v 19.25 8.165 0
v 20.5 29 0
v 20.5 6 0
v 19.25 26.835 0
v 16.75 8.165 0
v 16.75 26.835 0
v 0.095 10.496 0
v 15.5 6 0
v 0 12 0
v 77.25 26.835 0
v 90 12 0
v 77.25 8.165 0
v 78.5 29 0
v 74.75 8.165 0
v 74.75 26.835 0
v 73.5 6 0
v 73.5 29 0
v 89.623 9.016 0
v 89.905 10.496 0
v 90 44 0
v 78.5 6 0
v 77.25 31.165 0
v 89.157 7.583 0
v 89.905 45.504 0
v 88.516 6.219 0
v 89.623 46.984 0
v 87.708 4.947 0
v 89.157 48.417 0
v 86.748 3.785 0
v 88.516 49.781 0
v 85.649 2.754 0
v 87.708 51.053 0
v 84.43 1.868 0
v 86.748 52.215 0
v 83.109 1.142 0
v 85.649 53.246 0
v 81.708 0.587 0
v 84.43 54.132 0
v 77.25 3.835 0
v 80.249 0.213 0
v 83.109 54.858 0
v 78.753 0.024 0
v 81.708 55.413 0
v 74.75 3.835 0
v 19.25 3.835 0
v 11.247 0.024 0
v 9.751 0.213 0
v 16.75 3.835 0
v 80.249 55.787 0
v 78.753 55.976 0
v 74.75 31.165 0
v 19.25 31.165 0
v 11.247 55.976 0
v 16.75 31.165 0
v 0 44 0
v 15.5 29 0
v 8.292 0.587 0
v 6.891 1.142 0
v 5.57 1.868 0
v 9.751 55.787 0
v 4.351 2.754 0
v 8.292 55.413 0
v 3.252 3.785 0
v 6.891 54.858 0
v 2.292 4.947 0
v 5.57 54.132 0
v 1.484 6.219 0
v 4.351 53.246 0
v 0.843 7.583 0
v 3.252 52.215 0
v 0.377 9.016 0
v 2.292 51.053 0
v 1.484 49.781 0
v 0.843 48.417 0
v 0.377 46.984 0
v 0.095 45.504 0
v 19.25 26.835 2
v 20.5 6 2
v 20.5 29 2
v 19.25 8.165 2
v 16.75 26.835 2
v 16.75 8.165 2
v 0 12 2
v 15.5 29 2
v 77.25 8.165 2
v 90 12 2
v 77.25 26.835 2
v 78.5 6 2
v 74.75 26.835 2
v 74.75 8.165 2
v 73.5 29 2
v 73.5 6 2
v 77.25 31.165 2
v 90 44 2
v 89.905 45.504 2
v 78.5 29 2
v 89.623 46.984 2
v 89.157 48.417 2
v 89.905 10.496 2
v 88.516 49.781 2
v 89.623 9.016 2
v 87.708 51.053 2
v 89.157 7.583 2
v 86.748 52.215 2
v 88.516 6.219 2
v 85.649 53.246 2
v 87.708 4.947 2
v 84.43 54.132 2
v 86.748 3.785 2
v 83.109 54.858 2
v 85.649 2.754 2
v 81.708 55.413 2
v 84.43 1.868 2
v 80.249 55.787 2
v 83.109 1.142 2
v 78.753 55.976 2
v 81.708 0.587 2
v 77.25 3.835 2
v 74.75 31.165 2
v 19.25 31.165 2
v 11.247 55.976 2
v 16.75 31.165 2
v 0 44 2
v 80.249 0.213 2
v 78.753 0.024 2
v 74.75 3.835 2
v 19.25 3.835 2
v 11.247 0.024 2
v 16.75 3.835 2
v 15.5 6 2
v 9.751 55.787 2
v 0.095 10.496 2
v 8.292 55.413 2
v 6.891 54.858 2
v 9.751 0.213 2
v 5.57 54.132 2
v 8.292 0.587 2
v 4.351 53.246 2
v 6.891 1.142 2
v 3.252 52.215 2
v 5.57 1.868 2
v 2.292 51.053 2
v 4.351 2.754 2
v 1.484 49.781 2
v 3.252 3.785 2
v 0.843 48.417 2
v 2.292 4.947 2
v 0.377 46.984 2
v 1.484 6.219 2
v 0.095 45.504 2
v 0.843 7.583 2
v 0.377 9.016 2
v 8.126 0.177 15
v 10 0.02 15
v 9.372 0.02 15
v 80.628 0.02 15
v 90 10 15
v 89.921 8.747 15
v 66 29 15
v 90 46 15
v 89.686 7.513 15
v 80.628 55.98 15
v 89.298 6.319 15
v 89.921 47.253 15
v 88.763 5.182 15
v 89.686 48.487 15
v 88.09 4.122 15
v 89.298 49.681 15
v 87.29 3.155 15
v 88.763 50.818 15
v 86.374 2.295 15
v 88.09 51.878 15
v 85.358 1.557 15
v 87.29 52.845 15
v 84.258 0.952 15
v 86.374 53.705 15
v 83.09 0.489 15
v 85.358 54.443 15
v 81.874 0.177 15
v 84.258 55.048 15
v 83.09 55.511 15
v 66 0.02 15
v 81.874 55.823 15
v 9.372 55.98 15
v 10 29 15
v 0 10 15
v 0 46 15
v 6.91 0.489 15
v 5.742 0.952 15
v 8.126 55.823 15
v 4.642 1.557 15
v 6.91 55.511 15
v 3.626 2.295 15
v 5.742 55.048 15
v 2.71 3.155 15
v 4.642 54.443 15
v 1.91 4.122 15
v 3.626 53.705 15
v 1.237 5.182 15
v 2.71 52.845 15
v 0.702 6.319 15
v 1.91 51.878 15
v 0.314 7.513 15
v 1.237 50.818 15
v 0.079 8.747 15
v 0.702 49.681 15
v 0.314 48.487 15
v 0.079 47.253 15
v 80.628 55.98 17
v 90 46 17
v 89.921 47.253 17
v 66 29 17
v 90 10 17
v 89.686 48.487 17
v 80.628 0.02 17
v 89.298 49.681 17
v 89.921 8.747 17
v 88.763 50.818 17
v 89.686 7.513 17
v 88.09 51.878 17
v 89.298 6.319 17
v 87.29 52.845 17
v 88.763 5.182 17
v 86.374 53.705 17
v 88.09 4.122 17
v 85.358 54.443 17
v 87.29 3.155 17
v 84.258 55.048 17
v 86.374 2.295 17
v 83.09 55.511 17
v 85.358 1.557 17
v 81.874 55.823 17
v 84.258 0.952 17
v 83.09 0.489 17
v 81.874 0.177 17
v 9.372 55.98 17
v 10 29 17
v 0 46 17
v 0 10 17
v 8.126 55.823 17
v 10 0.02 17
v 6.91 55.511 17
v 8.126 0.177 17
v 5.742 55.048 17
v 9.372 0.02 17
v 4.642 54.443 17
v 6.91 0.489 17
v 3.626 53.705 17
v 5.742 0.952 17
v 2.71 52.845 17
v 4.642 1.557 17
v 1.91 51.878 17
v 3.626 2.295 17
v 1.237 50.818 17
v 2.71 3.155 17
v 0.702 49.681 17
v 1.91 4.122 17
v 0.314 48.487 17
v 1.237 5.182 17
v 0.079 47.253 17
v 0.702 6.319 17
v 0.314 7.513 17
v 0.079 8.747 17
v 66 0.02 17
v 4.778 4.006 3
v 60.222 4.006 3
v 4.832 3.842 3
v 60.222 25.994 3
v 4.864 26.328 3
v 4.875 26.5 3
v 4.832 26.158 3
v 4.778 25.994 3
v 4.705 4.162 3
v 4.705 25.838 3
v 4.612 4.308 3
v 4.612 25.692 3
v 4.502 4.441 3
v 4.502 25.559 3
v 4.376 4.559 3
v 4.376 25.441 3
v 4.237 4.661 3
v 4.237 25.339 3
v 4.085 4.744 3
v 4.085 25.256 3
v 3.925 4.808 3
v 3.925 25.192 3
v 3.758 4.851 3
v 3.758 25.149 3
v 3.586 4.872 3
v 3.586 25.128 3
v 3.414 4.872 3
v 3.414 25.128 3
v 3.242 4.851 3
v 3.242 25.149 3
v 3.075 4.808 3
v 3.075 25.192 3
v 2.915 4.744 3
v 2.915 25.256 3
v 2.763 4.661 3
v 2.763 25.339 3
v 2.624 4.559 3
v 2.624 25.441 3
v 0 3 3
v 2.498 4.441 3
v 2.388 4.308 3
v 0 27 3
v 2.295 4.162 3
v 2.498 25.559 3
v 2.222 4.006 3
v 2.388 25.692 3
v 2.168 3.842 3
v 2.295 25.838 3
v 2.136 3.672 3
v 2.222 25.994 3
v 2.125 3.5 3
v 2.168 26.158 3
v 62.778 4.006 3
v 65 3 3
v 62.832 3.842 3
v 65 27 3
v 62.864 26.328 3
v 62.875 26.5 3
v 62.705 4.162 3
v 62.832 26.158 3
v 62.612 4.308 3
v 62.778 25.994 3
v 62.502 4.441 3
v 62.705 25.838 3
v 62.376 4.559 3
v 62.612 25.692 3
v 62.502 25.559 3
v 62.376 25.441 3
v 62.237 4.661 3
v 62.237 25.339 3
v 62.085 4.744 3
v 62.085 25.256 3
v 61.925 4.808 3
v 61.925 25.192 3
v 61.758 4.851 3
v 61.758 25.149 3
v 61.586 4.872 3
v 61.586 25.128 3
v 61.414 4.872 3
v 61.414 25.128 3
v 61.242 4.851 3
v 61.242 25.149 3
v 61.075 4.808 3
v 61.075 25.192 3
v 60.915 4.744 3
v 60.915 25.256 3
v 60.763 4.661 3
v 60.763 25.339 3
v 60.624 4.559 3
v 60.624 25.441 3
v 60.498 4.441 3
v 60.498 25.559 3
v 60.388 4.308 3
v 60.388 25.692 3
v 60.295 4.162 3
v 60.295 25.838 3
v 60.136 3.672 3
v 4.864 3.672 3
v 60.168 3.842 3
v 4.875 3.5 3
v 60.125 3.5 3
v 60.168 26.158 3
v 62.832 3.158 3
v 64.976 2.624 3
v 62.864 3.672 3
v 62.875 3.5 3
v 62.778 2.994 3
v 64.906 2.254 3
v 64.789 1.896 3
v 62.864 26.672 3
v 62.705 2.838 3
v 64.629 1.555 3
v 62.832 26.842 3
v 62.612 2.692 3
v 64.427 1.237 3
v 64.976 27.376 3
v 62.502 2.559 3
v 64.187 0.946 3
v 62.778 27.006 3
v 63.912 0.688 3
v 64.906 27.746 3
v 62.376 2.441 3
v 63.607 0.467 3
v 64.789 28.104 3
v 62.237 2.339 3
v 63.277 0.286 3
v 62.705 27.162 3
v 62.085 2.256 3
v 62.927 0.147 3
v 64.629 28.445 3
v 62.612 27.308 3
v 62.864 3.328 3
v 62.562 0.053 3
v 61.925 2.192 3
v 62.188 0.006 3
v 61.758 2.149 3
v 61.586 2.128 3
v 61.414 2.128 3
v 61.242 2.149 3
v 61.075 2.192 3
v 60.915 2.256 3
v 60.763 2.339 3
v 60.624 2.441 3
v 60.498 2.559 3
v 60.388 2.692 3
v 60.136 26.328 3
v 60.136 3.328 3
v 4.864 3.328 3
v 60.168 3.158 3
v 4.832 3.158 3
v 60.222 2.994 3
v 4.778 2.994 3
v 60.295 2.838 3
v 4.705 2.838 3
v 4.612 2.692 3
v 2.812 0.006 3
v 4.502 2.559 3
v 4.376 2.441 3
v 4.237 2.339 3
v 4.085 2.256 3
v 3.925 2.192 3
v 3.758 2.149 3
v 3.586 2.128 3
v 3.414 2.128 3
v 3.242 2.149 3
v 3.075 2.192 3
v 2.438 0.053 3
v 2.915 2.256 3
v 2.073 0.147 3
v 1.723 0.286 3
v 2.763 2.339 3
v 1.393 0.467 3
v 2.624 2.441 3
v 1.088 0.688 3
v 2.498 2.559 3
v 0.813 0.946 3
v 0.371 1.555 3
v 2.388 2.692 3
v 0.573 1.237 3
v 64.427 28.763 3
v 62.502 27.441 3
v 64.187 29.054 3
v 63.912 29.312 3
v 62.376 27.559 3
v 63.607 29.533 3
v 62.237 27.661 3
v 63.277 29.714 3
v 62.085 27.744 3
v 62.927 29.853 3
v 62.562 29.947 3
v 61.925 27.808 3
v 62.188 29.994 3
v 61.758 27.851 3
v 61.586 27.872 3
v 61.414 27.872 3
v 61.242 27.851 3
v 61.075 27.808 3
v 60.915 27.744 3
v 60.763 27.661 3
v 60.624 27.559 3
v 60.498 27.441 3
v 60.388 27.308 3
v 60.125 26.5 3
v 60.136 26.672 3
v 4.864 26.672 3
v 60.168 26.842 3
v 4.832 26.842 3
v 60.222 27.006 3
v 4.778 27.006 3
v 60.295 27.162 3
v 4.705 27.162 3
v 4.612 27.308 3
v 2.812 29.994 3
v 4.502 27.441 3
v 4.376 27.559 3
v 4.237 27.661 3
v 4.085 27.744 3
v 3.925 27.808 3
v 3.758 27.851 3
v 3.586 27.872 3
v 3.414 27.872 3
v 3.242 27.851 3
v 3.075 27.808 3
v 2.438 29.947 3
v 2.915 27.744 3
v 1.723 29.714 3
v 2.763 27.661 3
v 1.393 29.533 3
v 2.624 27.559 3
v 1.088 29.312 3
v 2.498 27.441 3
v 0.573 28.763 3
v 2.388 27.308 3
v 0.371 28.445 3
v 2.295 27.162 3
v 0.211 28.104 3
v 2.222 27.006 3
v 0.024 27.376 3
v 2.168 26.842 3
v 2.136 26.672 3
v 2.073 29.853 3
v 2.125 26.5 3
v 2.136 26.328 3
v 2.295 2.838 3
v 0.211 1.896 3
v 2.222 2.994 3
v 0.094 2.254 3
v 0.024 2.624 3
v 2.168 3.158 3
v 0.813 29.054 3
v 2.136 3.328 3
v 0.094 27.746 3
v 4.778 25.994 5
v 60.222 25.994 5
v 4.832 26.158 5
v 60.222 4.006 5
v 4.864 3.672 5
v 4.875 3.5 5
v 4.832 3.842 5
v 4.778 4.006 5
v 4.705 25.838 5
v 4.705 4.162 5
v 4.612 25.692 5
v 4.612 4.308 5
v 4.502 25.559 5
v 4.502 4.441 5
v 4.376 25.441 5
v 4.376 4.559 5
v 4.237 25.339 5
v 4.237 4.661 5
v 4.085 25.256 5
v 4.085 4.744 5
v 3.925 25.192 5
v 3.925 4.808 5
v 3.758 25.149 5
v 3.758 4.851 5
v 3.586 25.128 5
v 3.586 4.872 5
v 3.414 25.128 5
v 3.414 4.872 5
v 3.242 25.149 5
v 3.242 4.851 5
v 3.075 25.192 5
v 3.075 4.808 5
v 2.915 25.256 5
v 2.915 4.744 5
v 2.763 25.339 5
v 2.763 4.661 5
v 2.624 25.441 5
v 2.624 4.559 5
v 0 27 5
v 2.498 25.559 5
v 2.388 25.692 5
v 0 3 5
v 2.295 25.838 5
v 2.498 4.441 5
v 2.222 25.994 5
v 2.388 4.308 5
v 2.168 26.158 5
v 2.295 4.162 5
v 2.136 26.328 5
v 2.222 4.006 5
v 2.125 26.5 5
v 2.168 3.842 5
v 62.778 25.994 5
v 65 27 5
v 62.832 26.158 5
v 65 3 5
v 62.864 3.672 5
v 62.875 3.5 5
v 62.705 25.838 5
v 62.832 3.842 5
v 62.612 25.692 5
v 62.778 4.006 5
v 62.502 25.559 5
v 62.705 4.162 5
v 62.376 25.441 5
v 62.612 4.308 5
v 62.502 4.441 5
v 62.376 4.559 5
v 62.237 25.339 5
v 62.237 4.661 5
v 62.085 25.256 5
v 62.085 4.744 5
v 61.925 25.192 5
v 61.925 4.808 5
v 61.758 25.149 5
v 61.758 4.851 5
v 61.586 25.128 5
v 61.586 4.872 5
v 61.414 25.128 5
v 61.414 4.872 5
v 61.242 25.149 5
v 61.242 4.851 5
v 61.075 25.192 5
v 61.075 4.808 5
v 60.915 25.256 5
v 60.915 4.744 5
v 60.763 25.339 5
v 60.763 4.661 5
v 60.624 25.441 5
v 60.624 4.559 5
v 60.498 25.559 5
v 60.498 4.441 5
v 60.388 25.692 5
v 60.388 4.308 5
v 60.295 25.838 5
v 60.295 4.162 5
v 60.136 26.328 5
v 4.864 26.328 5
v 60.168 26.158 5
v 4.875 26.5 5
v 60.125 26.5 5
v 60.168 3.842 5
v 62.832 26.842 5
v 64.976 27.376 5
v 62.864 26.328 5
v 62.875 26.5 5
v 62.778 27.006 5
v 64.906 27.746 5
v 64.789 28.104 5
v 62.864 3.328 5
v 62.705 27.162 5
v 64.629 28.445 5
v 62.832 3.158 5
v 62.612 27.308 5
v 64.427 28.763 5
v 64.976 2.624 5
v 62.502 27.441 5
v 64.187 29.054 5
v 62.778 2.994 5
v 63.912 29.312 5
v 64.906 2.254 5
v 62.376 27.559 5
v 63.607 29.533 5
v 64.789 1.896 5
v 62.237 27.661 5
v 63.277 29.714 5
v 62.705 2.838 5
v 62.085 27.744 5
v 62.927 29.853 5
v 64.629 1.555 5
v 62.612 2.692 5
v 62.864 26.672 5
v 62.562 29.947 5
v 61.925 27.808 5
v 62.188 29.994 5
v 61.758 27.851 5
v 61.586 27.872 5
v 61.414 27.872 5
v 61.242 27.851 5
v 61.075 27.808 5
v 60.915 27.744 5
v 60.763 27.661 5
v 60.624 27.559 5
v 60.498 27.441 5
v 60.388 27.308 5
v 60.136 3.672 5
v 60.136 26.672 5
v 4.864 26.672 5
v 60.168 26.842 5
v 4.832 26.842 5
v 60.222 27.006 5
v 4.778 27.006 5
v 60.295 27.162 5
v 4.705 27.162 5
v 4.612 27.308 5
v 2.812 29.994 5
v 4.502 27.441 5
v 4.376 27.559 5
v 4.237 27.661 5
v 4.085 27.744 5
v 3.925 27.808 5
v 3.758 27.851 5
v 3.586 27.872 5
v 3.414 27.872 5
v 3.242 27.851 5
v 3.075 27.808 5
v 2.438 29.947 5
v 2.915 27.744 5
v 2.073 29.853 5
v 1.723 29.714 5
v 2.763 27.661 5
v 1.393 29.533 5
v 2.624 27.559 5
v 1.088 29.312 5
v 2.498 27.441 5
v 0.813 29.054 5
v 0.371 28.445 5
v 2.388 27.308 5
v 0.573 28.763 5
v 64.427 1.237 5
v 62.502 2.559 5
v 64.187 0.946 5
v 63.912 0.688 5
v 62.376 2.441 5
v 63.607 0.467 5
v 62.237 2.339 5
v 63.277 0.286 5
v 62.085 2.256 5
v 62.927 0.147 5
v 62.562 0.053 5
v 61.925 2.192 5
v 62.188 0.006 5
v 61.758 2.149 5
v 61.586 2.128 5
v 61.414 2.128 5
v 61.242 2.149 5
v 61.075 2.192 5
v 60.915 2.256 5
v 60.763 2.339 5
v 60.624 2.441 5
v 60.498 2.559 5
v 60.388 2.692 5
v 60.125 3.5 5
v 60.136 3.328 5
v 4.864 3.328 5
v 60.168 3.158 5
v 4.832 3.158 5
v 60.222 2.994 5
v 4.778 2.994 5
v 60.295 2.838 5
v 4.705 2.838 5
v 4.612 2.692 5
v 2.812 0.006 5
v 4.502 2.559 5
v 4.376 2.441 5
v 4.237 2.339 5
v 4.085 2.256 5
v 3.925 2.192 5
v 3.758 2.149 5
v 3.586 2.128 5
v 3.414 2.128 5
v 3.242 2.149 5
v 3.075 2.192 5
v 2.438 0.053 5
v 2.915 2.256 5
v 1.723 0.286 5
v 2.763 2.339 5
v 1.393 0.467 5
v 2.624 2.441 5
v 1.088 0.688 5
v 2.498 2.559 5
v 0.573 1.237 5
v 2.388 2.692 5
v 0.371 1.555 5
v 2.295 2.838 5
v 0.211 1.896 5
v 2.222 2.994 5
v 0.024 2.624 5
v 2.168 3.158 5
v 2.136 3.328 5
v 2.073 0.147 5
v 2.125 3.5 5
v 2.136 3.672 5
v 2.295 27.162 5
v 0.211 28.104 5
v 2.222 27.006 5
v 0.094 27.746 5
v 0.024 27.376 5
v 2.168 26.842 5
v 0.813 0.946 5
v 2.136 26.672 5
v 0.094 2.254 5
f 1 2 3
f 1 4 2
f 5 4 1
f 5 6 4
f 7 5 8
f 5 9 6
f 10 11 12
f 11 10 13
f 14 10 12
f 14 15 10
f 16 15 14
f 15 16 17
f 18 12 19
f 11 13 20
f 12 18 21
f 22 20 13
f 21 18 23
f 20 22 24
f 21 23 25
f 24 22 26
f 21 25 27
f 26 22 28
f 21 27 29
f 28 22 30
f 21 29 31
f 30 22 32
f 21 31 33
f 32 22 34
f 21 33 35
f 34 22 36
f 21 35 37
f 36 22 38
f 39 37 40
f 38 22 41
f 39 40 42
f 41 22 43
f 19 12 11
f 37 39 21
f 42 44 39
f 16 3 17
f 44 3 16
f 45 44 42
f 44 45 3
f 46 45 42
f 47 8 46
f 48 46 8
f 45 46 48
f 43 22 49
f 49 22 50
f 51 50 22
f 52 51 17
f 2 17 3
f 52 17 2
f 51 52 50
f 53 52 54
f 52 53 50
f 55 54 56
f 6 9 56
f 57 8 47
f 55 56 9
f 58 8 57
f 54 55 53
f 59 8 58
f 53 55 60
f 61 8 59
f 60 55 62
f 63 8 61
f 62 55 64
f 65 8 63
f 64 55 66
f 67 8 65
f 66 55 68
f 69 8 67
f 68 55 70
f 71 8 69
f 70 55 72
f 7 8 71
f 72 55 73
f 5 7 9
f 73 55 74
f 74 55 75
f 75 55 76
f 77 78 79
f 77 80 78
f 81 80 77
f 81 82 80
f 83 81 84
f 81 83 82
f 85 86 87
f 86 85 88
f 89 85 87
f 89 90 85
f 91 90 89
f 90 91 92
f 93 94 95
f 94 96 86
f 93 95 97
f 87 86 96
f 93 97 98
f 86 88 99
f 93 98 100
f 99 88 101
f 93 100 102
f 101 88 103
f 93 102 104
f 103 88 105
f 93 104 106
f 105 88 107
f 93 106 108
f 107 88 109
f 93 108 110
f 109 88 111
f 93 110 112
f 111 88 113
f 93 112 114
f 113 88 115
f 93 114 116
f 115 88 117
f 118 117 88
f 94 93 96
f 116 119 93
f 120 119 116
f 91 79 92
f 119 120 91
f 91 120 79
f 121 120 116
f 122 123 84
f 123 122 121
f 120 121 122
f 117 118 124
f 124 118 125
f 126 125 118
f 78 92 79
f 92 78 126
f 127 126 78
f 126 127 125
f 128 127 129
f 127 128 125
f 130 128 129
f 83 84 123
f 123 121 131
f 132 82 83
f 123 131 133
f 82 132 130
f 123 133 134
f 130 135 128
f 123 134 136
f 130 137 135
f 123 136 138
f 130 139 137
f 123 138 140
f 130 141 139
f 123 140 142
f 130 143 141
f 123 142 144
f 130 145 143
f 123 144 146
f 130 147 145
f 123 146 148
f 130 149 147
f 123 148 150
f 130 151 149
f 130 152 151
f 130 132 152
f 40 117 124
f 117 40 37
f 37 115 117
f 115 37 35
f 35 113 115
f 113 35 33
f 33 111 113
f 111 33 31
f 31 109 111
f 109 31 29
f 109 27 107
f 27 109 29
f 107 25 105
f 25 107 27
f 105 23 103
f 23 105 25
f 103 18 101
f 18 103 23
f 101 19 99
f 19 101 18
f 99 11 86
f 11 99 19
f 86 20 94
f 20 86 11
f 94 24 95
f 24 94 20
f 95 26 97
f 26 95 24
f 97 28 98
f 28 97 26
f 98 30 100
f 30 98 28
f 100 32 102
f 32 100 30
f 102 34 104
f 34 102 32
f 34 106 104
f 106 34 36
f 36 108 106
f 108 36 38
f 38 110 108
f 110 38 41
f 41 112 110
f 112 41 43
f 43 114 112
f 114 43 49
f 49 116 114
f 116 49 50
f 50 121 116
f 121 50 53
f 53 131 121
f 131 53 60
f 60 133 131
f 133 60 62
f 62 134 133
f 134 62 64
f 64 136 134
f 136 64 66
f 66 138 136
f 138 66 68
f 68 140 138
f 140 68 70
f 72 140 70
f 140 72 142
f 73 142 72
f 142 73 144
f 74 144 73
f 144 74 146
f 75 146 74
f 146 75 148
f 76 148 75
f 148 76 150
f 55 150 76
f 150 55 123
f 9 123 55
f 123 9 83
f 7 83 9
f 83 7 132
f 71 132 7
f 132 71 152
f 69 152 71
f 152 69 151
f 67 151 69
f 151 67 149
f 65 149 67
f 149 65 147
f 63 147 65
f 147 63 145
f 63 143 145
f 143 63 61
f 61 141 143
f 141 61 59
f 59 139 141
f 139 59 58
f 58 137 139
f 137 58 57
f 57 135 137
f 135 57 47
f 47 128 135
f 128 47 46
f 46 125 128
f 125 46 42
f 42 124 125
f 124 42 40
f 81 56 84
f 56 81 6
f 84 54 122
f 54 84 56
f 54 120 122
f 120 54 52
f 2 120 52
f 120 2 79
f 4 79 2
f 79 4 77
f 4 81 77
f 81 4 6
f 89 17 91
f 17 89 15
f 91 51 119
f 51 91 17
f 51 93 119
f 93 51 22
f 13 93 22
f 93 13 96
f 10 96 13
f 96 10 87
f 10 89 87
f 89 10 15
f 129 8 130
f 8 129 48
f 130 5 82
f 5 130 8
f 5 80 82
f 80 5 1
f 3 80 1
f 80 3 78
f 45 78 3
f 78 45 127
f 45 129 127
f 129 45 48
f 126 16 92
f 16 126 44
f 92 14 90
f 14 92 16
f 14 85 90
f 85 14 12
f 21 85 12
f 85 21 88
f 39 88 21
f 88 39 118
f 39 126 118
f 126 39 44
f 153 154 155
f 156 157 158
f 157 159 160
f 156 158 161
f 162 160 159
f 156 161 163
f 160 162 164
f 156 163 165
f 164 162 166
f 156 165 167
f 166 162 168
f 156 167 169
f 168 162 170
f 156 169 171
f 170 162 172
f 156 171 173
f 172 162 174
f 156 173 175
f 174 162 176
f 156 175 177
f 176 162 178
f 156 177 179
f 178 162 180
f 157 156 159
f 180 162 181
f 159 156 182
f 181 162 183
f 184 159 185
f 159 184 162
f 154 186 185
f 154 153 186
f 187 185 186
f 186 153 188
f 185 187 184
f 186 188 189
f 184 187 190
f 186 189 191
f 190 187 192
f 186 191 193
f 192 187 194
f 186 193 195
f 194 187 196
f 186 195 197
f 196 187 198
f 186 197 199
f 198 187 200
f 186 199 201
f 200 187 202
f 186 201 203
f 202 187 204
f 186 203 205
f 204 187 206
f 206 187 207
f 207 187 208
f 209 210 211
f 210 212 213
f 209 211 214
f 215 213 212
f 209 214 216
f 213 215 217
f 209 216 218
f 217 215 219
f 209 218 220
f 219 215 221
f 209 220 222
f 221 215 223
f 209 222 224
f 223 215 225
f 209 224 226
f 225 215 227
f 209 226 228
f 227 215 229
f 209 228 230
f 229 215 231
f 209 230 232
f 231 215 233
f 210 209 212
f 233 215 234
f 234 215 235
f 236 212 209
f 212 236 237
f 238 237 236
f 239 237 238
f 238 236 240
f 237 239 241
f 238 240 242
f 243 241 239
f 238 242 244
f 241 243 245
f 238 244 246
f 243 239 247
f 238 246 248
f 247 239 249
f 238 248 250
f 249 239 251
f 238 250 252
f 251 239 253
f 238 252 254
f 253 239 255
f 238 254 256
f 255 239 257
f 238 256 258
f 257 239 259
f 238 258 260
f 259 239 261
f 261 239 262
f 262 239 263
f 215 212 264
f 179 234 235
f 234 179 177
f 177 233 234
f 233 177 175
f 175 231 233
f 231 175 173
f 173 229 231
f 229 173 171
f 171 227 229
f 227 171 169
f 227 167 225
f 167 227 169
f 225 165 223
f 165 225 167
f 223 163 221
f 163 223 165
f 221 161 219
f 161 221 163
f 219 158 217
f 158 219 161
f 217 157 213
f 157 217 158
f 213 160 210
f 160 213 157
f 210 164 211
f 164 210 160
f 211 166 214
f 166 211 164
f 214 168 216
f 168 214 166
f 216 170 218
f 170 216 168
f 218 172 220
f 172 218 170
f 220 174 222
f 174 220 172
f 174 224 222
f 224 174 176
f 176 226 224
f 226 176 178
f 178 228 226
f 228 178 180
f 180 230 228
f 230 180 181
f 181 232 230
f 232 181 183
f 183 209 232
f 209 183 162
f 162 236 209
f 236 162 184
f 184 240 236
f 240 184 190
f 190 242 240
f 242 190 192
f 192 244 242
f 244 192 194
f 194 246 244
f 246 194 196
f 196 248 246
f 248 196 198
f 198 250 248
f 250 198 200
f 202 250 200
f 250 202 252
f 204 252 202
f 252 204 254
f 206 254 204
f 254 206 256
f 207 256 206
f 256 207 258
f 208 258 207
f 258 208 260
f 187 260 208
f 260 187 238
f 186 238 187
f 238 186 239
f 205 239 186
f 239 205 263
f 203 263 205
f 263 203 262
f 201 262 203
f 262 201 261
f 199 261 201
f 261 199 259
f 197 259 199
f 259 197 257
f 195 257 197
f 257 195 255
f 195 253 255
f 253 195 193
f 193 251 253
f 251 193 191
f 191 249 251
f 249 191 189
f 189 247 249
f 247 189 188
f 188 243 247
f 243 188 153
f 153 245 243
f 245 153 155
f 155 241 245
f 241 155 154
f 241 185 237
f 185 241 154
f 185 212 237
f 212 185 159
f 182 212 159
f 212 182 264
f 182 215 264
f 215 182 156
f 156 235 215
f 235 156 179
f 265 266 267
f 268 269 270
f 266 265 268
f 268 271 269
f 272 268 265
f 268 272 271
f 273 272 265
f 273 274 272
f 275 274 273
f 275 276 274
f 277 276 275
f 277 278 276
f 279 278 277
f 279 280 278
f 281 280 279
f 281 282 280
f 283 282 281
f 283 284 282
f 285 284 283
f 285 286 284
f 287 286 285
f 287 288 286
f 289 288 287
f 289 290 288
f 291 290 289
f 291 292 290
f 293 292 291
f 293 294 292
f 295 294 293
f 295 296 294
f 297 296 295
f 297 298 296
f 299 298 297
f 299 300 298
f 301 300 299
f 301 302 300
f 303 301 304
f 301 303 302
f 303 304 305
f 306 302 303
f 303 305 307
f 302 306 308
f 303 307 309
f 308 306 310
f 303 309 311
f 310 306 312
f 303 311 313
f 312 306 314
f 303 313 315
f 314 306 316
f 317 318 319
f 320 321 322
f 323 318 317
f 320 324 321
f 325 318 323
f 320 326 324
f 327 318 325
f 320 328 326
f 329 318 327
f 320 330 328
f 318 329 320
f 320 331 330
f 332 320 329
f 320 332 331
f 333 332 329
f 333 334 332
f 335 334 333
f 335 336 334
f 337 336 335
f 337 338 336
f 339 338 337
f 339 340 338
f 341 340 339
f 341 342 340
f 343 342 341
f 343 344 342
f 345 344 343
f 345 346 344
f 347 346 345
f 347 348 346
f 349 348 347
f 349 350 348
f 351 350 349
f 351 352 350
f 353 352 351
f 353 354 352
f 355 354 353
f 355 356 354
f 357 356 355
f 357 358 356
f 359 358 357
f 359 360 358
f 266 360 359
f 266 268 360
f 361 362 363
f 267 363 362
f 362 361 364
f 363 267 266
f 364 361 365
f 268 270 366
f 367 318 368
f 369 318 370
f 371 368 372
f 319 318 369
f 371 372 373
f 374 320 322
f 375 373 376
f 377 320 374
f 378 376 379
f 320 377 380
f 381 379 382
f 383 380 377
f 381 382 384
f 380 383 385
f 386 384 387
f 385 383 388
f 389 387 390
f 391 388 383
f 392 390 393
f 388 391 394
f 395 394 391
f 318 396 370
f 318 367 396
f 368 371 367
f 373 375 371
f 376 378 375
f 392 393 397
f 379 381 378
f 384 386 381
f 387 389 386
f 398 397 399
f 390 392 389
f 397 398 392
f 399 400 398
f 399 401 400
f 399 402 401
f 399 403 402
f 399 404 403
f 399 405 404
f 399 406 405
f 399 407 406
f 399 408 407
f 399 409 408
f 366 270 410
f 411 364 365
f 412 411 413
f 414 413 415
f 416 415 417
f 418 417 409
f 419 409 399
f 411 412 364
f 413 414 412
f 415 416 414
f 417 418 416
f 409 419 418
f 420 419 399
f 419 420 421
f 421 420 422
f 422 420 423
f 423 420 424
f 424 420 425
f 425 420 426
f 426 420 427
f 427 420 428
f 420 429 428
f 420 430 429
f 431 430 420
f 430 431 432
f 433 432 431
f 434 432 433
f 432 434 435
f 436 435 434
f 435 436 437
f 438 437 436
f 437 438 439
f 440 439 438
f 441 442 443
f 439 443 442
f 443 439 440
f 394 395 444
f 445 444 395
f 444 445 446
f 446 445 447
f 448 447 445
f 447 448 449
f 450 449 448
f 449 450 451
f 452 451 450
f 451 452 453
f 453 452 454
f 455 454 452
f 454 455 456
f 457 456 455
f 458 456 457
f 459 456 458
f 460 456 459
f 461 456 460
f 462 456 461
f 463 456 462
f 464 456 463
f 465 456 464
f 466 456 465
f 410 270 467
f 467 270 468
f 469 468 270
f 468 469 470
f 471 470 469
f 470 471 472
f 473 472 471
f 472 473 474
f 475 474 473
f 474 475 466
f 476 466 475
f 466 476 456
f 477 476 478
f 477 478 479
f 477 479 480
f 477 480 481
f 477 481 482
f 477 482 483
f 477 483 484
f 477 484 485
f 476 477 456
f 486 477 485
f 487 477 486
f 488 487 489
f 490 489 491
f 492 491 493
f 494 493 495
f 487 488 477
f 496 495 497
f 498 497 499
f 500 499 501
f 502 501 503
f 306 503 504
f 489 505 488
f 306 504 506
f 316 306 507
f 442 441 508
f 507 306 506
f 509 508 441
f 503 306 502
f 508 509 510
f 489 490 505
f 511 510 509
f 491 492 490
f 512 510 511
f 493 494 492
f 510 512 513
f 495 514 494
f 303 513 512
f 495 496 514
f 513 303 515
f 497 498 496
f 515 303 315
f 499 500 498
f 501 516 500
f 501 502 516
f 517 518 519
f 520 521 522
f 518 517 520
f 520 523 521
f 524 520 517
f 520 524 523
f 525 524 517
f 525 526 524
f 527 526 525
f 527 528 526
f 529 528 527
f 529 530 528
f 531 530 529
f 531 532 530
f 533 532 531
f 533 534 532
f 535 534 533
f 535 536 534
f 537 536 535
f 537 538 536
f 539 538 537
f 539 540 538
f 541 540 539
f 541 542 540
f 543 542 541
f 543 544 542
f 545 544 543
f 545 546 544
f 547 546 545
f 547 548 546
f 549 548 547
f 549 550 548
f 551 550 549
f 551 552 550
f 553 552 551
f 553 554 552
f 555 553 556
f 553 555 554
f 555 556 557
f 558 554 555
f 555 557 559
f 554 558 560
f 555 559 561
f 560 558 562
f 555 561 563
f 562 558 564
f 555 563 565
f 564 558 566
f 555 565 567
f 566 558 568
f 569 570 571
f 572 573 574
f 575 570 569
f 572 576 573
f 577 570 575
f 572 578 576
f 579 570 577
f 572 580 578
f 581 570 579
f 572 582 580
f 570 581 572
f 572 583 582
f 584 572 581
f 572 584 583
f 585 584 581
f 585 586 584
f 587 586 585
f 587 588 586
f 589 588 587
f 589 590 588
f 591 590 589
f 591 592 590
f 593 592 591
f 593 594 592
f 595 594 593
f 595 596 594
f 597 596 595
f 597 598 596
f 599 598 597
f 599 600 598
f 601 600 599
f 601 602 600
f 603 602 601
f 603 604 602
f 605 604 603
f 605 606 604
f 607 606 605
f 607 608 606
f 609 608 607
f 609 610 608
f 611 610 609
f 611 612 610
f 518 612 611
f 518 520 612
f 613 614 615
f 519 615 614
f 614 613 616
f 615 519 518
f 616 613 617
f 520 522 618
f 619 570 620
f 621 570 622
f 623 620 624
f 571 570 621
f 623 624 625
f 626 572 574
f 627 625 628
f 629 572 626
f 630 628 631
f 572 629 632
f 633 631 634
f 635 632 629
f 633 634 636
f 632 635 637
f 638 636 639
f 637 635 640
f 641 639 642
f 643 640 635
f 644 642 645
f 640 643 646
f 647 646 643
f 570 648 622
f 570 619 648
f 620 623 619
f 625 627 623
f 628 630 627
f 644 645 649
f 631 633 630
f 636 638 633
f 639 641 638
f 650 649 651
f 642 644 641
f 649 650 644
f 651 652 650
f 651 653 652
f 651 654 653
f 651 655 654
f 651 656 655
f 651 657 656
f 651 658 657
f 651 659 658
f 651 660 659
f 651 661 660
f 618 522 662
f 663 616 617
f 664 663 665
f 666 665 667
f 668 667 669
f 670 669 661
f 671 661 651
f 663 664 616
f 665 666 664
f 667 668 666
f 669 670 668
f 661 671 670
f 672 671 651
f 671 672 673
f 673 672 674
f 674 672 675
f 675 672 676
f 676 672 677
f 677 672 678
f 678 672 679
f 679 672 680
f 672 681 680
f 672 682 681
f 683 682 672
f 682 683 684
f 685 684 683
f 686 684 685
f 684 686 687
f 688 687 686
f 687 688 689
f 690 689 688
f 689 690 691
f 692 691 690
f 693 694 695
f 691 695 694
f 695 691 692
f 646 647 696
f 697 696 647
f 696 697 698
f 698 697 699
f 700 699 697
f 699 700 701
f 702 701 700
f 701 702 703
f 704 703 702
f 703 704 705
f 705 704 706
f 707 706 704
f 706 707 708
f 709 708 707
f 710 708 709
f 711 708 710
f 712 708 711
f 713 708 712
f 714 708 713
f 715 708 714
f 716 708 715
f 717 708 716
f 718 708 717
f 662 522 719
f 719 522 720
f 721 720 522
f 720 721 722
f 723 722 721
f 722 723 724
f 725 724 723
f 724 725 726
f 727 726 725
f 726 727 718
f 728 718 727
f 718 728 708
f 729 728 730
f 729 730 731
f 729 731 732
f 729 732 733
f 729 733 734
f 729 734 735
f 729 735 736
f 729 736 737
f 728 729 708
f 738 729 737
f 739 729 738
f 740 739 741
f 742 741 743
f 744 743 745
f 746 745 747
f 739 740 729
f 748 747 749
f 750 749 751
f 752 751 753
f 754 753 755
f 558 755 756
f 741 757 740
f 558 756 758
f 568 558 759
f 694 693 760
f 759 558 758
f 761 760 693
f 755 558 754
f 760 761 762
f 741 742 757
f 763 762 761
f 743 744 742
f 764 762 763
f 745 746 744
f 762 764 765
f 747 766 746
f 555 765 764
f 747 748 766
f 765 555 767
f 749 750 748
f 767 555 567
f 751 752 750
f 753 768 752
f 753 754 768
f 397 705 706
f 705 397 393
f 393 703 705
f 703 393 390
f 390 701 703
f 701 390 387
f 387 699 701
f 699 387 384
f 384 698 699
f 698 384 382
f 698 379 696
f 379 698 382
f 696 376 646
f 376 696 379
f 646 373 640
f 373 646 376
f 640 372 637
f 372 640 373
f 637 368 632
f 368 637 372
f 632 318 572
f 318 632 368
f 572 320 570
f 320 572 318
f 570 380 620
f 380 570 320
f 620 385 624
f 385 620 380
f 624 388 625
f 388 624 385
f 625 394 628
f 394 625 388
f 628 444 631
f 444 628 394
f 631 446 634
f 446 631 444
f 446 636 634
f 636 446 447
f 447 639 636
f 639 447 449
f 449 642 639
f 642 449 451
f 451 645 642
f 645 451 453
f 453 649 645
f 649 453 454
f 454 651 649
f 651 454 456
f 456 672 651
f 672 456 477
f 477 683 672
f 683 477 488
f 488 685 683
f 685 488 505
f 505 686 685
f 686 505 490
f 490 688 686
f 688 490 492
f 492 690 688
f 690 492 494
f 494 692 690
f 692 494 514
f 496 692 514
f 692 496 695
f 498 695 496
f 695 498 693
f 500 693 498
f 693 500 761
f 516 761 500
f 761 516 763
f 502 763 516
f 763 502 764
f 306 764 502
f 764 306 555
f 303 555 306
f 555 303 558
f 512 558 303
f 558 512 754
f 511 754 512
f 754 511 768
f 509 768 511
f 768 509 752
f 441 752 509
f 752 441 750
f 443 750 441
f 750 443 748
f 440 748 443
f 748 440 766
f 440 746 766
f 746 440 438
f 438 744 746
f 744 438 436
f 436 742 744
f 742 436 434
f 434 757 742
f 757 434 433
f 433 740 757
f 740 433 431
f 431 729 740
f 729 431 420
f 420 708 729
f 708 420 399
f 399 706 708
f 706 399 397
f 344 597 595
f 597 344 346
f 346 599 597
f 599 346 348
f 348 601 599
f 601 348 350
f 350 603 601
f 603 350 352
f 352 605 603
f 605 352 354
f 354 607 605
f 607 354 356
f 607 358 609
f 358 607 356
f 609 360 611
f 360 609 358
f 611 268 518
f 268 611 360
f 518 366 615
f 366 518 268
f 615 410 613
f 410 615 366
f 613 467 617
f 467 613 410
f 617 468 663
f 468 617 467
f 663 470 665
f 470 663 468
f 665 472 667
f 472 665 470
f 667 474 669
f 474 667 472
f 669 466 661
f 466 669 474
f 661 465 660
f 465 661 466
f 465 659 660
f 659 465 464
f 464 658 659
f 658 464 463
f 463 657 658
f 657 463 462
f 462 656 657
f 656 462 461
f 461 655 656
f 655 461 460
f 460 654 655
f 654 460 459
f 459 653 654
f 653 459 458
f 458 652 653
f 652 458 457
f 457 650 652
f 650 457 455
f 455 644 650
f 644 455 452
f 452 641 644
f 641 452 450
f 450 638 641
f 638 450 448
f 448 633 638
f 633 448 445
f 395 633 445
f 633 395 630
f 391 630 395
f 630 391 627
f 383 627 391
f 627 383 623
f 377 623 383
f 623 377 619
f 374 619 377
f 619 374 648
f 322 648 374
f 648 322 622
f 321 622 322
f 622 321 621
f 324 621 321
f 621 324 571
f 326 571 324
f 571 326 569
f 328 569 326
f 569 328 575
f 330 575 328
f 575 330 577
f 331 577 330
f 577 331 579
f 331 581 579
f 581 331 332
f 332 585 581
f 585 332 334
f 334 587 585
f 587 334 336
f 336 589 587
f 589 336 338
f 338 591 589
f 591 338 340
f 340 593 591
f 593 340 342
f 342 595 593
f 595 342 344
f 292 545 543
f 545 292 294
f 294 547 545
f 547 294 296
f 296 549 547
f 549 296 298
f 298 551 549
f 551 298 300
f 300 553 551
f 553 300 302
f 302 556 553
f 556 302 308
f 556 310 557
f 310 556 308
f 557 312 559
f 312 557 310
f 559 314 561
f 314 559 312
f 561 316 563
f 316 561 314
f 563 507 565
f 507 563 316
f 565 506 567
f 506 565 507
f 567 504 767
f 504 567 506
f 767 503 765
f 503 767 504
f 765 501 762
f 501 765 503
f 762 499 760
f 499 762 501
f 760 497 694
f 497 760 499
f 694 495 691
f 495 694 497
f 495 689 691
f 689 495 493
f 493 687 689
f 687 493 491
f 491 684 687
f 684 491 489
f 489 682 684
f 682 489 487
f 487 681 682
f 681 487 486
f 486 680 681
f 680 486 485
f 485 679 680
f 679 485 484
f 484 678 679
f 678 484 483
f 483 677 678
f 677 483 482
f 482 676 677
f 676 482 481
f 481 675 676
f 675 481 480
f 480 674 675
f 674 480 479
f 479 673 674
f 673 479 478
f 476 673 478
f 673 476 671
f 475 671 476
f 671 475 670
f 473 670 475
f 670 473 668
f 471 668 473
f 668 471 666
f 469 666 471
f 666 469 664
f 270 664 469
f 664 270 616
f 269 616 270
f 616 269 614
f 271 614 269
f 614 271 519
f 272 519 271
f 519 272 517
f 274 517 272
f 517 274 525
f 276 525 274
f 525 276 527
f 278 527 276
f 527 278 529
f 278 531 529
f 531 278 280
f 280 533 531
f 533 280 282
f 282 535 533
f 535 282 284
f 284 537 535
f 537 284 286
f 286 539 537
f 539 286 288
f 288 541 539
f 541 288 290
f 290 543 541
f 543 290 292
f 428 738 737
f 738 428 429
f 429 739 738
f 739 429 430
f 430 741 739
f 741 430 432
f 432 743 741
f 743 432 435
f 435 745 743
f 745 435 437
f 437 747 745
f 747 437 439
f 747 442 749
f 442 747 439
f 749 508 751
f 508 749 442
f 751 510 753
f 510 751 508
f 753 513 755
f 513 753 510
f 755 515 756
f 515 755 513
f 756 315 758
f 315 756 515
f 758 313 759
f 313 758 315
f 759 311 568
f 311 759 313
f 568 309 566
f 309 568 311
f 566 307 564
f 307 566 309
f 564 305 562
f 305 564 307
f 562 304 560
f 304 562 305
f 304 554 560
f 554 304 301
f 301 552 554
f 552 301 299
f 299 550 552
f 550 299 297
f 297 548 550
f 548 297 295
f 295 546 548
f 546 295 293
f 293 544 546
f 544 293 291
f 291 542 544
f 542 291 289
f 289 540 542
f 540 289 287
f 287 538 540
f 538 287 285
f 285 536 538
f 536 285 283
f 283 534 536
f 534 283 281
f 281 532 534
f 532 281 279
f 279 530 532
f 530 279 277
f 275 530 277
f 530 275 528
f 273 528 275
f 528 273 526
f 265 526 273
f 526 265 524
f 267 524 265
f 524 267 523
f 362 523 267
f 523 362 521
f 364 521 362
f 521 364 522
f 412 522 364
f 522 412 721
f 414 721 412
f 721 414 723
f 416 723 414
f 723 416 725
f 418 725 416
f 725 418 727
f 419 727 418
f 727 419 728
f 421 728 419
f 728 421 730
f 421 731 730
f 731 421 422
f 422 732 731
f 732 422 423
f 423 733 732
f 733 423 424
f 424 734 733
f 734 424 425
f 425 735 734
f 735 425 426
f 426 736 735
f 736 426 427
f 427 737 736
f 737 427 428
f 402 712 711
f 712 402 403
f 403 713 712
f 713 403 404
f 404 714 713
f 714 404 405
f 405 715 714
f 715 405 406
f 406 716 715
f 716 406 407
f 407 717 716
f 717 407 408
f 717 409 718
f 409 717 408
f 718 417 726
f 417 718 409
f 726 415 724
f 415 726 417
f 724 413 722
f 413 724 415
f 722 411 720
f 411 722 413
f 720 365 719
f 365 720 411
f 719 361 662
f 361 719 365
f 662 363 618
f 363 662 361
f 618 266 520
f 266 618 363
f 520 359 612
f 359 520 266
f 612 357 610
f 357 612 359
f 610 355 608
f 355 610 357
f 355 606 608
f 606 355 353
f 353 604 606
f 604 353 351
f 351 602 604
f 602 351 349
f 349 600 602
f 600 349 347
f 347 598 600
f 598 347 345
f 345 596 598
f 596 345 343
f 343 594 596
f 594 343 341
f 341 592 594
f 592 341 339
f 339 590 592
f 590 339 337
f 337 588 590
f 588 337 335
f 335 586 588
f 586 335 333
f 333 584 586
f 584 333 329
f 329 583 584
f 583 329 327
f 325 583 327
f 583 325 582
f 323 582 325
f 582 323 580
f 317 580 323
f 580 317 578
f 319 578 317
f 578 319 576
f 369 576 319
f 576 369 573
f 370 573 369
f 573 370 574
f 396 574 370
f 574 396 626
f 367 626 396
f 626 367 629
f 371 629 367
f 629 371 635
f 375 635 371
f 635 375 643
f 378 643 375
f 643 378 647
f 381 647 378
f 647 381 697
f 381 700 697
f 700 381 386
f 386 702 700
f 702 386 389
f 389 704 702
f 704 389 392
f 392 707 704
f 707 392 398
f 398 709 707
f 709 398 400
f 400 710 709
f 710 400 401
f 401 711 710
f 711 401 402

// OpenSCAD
// file: peppermint_bottom.scad
$fn = 50;

corner_radius = 12;
width = 90 - 2*corner_radius;
height = 56 - 2*corner_radius;

nut_diameter = 5;
nut_height = 2;

pi_zero_mount_x_distance = 58;
pi_zero_mount_y_distance = 23;
pi_zero_mount_x_offset = 3.5;
pi_zero_mount_y_offset = 3.5;

module peppermint_bottom_plate(){
    minkowski(){
        square([width, height]);
        circle(corner_radius
    );
    }
}

module nut_hole(){
    circle(d = nut_diameter, $fn=6);
}

module nut_holes(){
    nut_hole();
    translate([pi_zero_mount_x_distance,0,0]){
        nut_hole();
    }
    translate([0,pi_zero_mount_y_distance,0]){
        nut_hole();
    }
    translate([pi_zero_mount_x_distance,pi_zero_mount_y_distance,0]){
        nut_hole();
    }
}

module peppermint_bottom() {
    translate([corner_radius
, corner_radius
, 0]) {
        linear_extrude(2){
            difference(){
                peppermint_bottom_plate();
                translate([nut_diameter/2 + pi_zero_mount_x_offset, -(nut_diameter/2 + pi_zero_mount_y_offset),0]){
                    nut_holes();
                }
            }
        }
    }
    
}

peppermint_bottom();
// file: peppermint_top.scad
$fn = 50;

r = 10;
width = 90 - 2*r;
height = 56 - 2*r;

waveshare_width = 56;
waveshare_heigth = 29;

module peppermint_top_plate(){
    minkowski(){
        square([width, height]);
        circle(r);
    }
}

module waveshare_display(){
    square([waveshare_width, waveshare_heigth]);
}

module peppermint_top(){
    translate([r, r, 0]) {
        linear_extrude(2){
            difference(){
                peppermint_top_plate();
                translate([0, -r, 0]){
                    waveshare_display();
                }
            }
        }
    }
    
}

peppermint_top();
// file: raspberry_pi_zero.scad
$fn = 50;

corner_radius = 3;

width = 65;
height = 30;
mounting_hole_diameter = 2.75;
mounting_hole_offset = 3.5;


module pi_zero_body(){
    minkowski(){
        square([width - corner_radius * 2, height - corner_radius * 2]);
        circle(corner_radius);
    }
}

module hole(){
    circle(d = mounting_hole_diameter);
}

module holes(){
    
    translate([-corner_radius + mounting_hole_offset, -corner_radius + mounting_hole_offset, 0]){
        hole();
    }
    translate([-corner_radius + width - mounting_hole_offset, -corner_radius + mounting_hole_offset, 0]){
        hole();
    }
    translate([-corner_radius + width - mounting_hole_offset, -corner_radius +  height - mounting_hole_offset, 0]){
        hole();
    }

    translate([-corner_radius + mounting_hole_offset, -corner_radius +  height - mounting_hole_offset, 0]){
        hole();
    }
}
module raspberry_pi_zero(){
    translate([corner_radius, corner_radius, 0]) {
        color("green") {
            linear_extrude(2){
                difference() {
                    pi_zero_body();
                    holes();
                    
                }
            }
        }
        
    }
    
}
raspberry_pi_zero();
// main file
use <raspberry_pi_zero.scad>
use <peppermint_top.scad>
use <peppermint_bottom.scad>

case_inner_height = 18;
case_inner_node = 2;
case_total_height = case_inner_height + case_inner_node;

peppermint_bottom();
translate([0, 0, 15]) {
    peppermint_top();
}

// Raspberry Pi Zero
translate([0, 0, 3]) {
    raspberry_pi_zero();
}
